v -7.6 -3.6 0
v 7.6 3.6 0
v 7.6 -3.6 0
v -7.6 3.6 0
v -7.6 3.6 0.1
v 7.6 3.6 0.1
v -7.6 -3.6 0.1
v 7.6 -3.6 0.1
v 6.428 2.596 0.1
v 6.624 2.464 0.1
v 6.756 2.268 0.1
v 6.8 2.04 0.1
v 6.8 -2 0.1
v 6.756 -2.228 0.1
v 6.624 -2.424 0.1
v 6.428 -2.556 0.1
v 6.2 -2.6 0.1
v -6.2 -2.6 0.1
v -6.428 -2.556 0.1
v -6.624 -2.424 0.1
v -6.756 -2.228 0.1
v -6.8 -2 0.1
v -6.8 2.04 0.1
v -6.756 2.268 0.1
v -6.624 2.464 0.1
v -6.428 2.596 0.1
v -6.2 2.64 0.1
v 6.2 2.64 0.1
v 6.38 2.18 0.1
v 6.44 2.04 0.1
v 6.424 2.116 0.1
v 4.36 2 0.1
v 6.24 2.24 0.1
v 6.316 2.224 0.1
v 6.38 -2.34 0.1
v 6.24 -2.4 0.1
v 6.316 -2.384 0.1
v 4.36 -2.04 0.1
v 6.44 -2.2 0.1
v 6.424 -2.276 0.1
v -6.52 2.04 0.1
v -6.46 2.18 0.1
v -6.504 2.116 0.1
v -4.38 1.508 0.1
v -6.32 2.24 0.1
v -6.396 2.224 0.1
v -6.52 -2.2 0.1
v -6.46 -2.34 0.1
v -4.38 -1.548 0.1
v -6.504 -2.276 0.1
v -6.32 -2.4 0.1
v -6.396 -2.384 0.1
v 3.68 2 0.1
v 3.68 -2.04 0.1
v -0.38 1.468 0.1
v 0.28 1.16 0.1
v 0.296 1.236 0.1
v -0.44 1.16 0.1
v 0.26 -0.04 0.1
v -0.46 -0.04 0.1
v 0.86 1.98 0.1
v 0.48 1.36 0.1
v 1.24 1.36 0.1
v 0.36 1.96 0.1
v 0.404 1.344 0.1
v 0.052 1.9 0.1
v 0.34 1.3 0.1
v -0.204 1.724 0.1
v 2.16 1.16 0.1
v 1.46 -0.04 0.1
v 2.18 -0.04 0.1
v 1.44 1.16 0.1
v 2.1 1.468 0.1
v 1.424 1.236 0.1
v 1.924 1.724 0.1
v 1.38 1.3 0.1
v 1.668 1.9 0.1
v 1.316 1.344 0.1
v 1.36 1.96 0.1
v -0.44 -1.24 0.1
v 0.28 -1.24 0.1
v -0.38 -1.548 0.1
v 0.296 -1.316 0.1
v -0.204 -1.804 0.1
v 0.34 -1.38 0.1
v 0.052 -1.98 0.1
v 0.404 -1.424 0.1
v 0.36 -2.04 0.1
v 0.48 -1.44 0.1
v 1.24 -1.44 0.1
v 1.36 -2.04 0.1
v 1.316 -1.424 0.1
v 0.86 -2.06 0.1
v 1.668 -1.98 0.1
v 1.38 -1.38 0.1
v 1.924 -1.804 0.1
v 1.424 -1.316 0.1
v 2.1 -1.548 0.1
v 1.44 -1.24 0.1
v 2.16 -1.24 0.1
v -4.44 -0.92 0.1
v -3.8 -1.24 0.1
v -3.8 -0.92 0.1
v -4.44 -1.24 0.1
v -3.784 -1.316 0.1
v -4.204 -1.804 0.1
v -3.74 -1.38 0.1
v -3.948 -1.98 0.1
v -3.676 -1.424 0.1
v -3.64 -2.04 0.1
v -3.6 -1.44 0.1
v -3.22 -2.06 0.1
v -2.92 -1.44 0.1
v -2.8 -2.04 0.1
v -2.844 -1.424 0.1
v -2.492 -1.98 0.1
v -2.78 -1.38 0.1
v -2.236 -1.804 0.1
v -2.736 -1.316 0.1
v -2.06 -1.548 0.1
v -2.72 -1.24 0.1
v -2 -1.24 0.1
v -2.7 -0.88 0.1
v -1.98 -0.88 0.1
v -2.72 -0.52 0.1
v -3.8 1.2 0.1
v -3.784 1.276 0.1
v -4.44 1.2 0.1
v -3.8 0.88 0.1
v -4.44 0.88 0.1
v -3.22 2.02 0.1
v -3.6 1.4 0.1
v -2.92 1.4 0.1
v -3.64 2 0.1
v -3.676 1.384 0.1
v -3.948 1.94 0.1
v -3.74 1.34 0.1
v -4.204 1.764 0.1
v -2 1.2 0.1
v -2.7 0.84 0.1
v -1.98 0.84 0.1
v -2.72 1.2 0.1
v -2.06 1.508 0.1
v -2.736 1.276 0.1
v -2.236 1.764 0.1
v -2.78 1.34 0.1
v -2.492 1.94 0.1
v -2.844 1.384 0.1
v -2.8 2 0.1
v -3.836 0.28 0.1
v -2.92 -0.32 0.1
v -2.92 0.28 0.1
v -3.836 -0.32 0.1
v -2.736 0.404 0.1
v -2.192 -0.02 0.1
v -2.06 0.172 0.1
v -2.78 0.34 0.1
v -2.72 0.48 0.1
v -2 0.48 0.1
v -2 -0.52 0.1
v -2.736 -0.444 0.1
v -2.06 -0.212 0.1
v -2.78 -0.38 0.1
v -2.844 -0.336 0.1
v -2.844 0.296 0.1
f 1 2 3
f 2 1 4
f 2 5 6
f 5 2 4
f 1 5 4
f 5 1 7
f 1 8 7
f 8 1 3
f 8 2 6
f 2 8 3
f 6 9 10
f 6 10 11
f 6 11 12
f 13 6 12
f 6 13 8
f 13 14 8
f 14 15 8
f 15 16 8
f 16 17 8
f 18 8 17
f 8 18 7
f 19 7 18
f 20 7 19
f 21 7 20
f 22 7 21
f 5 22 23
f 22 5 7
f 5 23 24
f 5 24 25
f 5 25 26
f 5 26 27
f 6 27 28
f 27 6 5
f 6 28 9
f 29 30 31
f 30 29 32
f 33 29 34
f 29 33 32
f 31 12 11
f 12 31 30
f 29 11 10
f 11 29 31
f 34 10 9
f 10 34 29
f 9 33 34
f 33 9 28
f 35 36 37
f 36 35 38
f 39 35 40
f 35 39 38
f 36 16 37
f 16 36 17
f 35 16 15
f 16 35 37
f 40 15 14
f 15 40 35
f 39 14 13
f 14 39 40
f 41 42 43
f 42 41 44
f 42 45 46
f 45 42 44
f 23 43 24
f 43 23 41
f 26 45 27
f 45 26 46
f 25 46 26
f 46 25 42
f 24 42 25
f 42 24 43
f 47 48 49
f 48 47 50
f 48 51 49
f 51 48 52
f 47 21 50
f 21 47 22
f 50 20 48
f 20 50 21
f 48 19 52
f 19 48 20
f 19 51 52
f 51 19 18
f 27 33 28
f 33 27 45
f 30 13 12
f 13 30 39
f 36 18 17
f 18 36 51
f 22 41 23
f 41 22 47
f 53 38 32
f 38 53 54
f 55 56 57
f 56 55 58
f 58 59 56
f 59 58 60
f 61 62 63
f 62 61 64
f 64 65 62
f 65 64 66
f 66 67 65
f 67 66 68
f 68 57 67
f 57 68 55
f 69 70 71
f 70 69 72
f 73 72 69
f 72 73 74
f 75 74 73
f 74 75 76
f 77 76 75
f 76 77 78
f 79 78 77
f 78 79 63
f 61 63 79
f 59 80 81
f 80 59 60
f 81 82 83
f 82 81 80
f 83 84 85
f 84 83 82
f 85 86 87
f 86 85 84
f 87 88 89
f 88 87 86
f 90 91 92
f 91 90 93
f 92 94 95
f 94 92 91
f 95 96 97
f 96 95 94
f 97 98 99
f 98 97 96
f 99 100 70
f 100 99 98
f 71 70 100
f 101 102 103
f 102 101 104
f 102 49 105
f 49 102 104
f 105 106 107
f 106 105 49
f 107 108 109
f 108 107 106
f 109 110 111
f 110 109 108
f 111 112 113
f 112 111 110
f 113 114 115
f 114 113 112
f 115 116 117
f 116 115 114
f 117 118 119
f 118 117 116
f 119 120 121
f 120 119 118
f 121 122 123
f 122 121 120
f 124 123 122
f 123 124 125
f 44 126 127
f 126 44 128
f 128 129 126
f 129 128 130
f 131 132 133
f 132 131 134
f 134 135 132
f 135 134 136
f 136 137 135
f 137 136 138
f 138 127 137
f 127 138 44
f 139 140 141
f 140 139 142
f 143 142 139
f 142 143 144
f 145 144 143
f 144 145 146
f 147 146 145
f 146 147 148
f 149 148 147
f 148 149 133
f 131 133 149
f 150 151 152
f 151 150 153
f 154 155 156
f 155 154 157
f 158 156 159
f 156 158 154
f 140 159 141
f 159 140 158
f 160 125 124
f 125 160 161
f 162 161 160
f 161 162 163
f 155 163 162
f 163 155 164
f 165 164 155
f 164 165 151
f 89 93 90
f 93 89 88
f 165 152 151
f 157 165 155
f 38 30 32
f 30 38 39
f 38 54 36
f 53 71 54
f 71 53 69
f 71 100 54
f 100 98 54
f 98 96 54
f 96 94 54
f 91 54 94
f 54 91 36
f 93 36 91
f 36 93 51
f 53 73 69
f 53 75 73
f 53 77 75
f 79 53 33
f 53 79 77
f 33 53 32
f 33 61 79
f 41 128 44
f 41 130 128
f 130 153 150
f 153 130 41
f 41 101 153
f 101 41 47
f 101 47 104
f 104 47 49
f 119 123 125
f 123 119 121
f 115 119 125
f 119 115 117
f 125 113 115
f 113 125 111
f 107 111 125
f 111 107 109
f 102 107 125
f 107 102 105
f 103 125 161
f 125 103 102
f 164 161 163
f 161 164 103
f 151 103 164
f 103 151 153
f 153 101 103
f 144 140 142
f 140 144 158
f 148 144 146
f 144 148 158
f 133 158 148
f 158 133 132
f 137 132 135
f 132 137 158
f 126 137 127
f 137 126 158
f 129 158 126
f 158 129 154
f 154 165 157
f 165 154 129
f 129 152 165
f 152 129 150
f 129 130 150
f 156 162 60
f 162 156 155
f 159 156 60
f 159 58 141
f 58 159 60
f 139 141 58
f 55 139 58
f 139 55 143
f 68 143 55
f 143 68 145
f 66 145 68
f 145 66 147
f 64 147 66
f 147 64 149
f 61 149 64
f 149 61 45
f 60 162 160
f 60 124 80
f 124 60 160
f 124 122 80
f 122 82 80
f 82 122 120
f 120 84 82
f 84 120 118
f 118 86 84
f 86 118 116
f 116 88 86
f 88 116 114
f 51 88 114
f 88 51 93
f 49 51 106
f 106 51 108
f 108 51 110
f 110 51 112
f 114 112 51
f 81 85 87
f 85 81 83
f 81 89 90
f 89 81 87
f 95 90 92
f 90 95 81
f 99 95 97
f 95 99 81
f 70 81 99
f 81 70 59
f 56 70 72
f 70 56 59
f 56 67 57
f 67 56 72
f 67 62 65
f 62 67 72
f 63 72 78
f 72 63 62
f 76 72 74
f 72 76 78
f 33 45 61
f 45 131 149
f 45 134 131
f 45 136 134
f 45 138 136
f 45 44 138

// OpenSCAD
// file: ../p/box5-12.scad
use <../lib.scad>
function ldraw_lib__box5_12() = [
// 0 Box with 5 Faces without Any Edges
// 0 Name: box5-12.dat
// 0 Author: Chris Dee [cwdee]
// 0 !LDRAW_ORG Primitive UPDATE 2009-02
// 0 !LICENSE Licensed under CC BY 4.0 : see CAreadme.txt
// 
// 0 BFC CERTIFY CCW
  [0,"BFC","CERTIFY"],
  [0,"BFC","CCW"],
// 
// 0 !HISTORY 2009-09-03 [PTadmin] Official Update 2009-02
// 
// 
// 4 16 1 1 1 1 1 -1 -1 1 -1 -1 1 1
  [4,16,1,1,1,1,1,-1,-1,1,-1,-1,1,1],
// 4 16 -1 0 1 1 0 1 1 1 1 -1 1 1
  [4,16,-1,0,1,1,0,1,1,1,1,-1,1,1],
// 4 16 -1 0 -1 -1 0 1 -1 1 1 -1 1 -1
  [4,16,-1,0,-1,-1,0,1,-1,1,1,-1,1,-1],
// 4 16 1 0 -1 -1 0 -1 -1 1 -1 1 1 -1
  [4,16,1,0,-1,-1,0,-1,-1,1,-1,1,1,-1],
// 4 16 1 0 1 1 0 -1 1 1 -1 1 1 1
  [4,16,1,0,1,1,0,-1,1,1,-1,1,1,1],
// 0
];
module ldraw_lib__box5_12(step=0, col=false, unit=2/5, alt=false, line=0.2, solid=!$preview)
    makepoly(ldraw_lib__box5_12(), step=step, col=col, unit=unit, alt=alt, line=line, solid=solid);
ldraw_lib__box5_12(line=0.2);
// main file
use <../lib.scad>
use <../p/box5-12.scad>
function ldraw_lib__4174735e() = [
// 0 Sticker  0.9 x  1.9 with White "301" on Black Background with Silver Outline
// 0 Name: 4174735e.dat
// 0 Author: Gerald Lasser [GeraldLasser]
// 0 !LDRAW_ORG Part UPDATE 2024-04
// 0 !LICENSE Licensed under CC BY 4.0 : see CAreadme.txt
// 
// 0 BFC CERTIFY CCW
  [0,"BFC","CERTIFY"],
  [0,"BFC","CCW"],
// 
// 0 !KEYWORDS santa fe, Set 10020
// 
// 0 !HISTORY 2024-05-28 [OrionP] Official Update 2024-04
// 
// 
// 1 16 0 -0.25 0 19 0 0 0 0.25 0 0 0 9 box5-12.dat
  [1,16,0,-0.25,0,19,0,0,0,0.25,0,0,0,9, ldraw_lib__box5_12()],
// 
// 3 16 19 -.25 9 16.07 -.25 6.49 16.56 -.25 6.16
  [3,16,19,-.25,9,16.07,-.25,6.49,16.56,-.25,6.16],
// 3 16 19 -.25 9 16.56 -.25 6.16 16.89 -.25 5.67
  [3,16,19,-.25,9,16.56,-.25,6.16,16.89,-.25,5.67],
// 3 16 19 -.25 9 16.89 -.25 5.67 17 -.25 5.1
  [3,16,19,-.25,9,16.89,-.25,5.67,17,-.25,5.1],
// 4 16 19 -.25 9 17 -.25 5.1 17 -.25 -5 19 -.25 -9
  [4,16,19,-.25,9,17,-.25,5.1,17,-.25,-5,19,-.25,-9],
// 3 16 17 -.25 -5 16.89 -.25 -5.57 19 -.25 -9
  [3,16,17,-.25,-5,16.89,-.25,-5.57,19,-.25,-9],
// 3 16 16.89 -.25 -5.57 16.56 -.25 -6.06 19 -.25 -9
  [3,16,16.89,-.25,-5.57,16.56,-.25,-6.06,19,-.25,-9],
// 3 16 16.56 -.25 -6.06 16.07 -.25 -6.39 19 -.25 -9
  [3,16,16.56,-.25,-6.06,16.07,-.25,-6.39,19,-.25,-9],
// 3 16 16.07 -.25 -6.39 15.5 -.25 -6.5 19 -.25 -9
  [3,16,16.07,-.25,-6.39,15.5,-.25,-6.5,19,-.25,-9],
// 4 16 19 -.25 -9 15.5 -.25 -6.5 -15.5 -.25 -6.5 -19 -.25 -9
  [4,16,19,-.25,-9,15.5,-.25,-6.5,-15.5,-.25,-6.5,-19,-.25,-9],
// 3 16 -16.07 -.25 -6.39 -19 -.25 -9 -15.5 -.25 -6.5
  [3,16,-16.07,-.25,-6.39,-19,-.25,-9,-15.5,-.25,-6.5],
// 3 16 -16.56 -.25 -6.06 -19 -.25 -9 -16.07 -.25 -6.39
  [3,16,-16.56,-.25,-6.06,-19,-.25,-9,-16.07,-.25,-6.39],
// 3 16 -16.89 -.25 -5.57 -19 -.25 -9 -16.56 -.25 -6.06
  [3,16,-16.89,-.25,-5.57,-19,-.25,-9,-16.56,-.25,-6.06],
// 3 16 -17 -.25 -5 -19 -.25 -9 -16.89 -.25 -5.57
  [3,16,-17,-.25,-5,-19,-.25,-9,-16.89,-.25,-5.57],
// 4 16 -19 -.25 -9 -17 -.25 -5 -17 -.25 5.1 -19 -.25 9
  [4,16,-19,-.25,-9,-17,-.25,-5,-17,-.25,5.1,-19,-.25,9],
// 3 16 -19 -.25 9 -17 -.25 5.1 -16.89 -.25 5.67
  [3,16,-19,-.25,9,-17,-.25,5.1,-16.89,-.25,5.67],
// 3 16 -19 -.25 9 -16.89 -.25 5.67 -16.56 -.25 6.16
  [3,16,-19,-.25,9,-16.89,-.25,5.67,-16.56,-.25,6.16],
// 3 16 -19 -.25 9 -16.56 -.25 6.16 -16.07 -.25 6.49
  [3,16,-19,-.25,9,-16.56,-.25,6.16,-16.07,-.25,6.49],
// 3 16 -19 -.25 9 -16.07 -.25 6.49 -15.5 -.25 6.6
  [3,16,-19,-.25,9,-16.07,-.25,6.49,-15.5,-.25,6.6],
// 4 16 19 -.25 9 -19 -.25 9 -15.5 -.25 6.6 15.5 -.25 6.6
  [4,16,19,-.25,9,-19,-.25,9,-15.5,-.25,6.6,15.5,-.25,6.6],
// 3 16 19 -.25 9 15.5 -.25 6.6 16.07 -.25 6.49
  [3,16,19,-.25,9,15.5,-.25,6.6,16.07,-.25,6.49],
// 
// 0 BFC NOCLIP
  [0,"BFC","NOCLIP"],
// 4 0 10.9 -.25 5 16.1 -.25 5.1 16.06 -.25 5.29 15.95 -.25 5.45
  [4,0,10.9,-.25,5,16.1,-.25,5.1,16.06,-.25,5.29,15.95,-.25,5.45],
// 4 0 10.9 -.25 5 15.95 -.25 5.45 15.79 -.25 5.56 15.6 -.25 5.6
  [4,0,10.9,-.25,5,15.95,-.25,5.45,15.79,-.25,5.56,15.6,-.25,5.6],
// 4 80 16.06 -.25 5.29 16.1 -.25 5.1 17 -.25 5.1 16.89 -.25 5.67
  [4,80,16.06,-.25,5.29,16.1,-.25,5.1,17,-.25,5.1,16.89,-.25,5.67],
// 4 80 15.95 -.25 5.45 16.06 -.25 5.29 16.89 -.25 5.67 16.56 -.25 6.16
  [4,80,15.95,-.25,5.45,16.06,-.25,5.29,16.89,-.25,5.67,16.56,-.25,6.16],
// 4 80 15.79 -.25 5.56 15.95 -.25 5.45 16.56 -.25 6.16 16.07 -.25 6.49
  [4,80,15.79,-.25,5.56,15.95,-.25,5.45,16.56,-.25,6.16,16.07,-.25,6.49],
// 4 80 15.6 -.25 5.6 15.79 -.25 5.56 16.07 -.25 6.49 15.5 -.25 6.6
  [4,80,15.6,-.25,5.6,15.79,-.25,5.56,16.07,-.25,6.49,15.5,-.25,6.6],
// 4 0 10.9 -.25 -5.1 15.6 -.25 -6 15.79 -.25 -5.96 15.95 -.25 -5.85
  [4,0,10.9,-.25,-5.1,15.6,-.25,-6,15.79,-.25,-5.96,15.95,-.25,-5.85],
// 4 0 10.9 -.25 -5.1 15.95 -.25 -5.85 16.06 -.25 -5.69 16.1 -.25 -5.5
  [4,0,10.9,-.25,-5.1,15.95,-.25,-5.85,16.06,-.25,-5.69,16.1,-.25,-5.5],
// 4 80 15.79 -.25 -5.96 15.6 -.25 -6 15.5 -.25 -6.5 16.07 -.25 -6.39
  [4,80,15.79,-.25,-5.96,15.6,-.25,-6,15.5,-.25,-6.5,16.07,-.25,-6.39],
// 4 80 15.95 -.25 -5.85 15.79 -.25 -5.96 16.07 -.25 -6.39 16.56 -.25 -6.06
  [4,80,15.95,-.25,-5.85,15.79,-.25,-5.96,16.07,-.25,-6.39,16.56,-.25,-6.06],
// 4 80 16.06 -.25 -5.69 15.95 -.25 -5.85 16.56 -.25 -6.06 16.89 -.25 -5.57
  [4,80,16.06,-.25,-5.69,15.95,-.25,-5.85,16.56,-.25,-6.06,16.89,-.25,-5.57],
// 4 80 16.1 -.25 -5.5 16.06 -.25 -5.69 16.89 -.25 -5.57 17 -.25 -5
  [4,80,16.1,-.25,-5.5,16.06,-.25,-5.69,16.89,-.25,-5.57,17,-.25,-5],
// 4 0 -16.26 -.25 5.29 -16.3 -.25 5.1 -10.95 -.25 3.77 -16.15 -.25 5.45
  [4,0,-16.26,-.25,5.29,-16.3,-.25,5.1,-10.95,-.25,3.77,-16.15,-.25,5.45],
// 4 0 -10.95 -.25 3.77 -15.8 -.25 5.6 -15.99 -.25 5.56 -16.15 -.25 5.45
  [4,0,-10.95,-.25,3.77,-15.8,-.25,5.6,-15.99,-.25,5.56,-16.15,-.25,5.45],
// 4 80 -16.3 -.25 5.1 -16.26 -.25 5.29 -16.89 -.25 5.67 -17 -.25 5.1
  [4,80,-16.3,-.25,5.1,-16.26,-.25,5.29,-16.89,-.25,5.67,-17,-.25,5.1],
// 4 80 -15.99 -.25 5.56 -15.8 -.25 5.6 -15.5 -.25 6.6 -16.07 -.25 6.49
  [4,80,-15.99,-.25,5.56,-15.8,-.25,5.6,-15.5,-.25,6.6,-16.07,-.25,6.49],
// 4 80 -16.15 -.25 5.45 -15.99 -.25 5.56 -16.07 -.25 6.49 -16.56 -.25 6.16
  [4,80,-16.15,-.25,5.45,-15.99,-.25,5.56,-16.07,-.25,6.49,-16.56,-.25,6.16],
// 4 80 -16.26 -.25 5.29 -16.15 -.25 5.45 -16.56 -.25 6.16 -16.89 -.25 5.67
  [4,80,-16.26,-.25,5.29,-16.15,-.25,5.45,-16.56,-.25,6.16,-16.89,-.25,5.67],
// 4 0 -10.95 -.25 -3.87 -16.3 -.25 -5.5 -16.26 -.25 -5.69 -16.15 -.25 -5.85
  [4,0,-10.95,-.25,-3.87,-16.3,-.25,-5.5,-16.26,-.25,-5.69,-16.15,-.25,-5.85],
// 4 0 -10.95 -.25 -3.87 -16.15 -.25 -5.85 -15.99 -.25 -5.96 -15.8 -.25 -6
  [4,0,-10.95,-.25,-3.87,-16.15,-.25,-5.85,-15.99,-.25,-5.96,-15.8,-.25,-6],
// 4 80 -16.26 -.25 -5.69 -16.3 -.25 -5.5 -17 -.25 -5 -16.89 -.25 -5.57
  [4,80,-16.26,-.25,-5.69,-16.3,-.25,-5.5,-17,-.25,-5,-16.89,-.25,-5.57],
// 4 80 -16.15 -.25 -5.85 -16.26 -.25 -5.69 -16.89 -.25 -5.57 -16.56 -.25 -6.06
  [4,80,-16.15,-.25,-5.85,-16.26,-.25,-5.69,-16.89,-.25,-5.57,-16.56,-.25,-6.06],
// 4 80 -15.99 -.25 -5.96 -16.15 -.25 -5.85 -16.56 -.25 -6.06 -16.07 -.25 -6.39
  [4,80,-15.99,-.25,-5.96,-16.15,-.25,-5.85,-16.56,-.25,-6.06,-16.07,-.25,-6.39],
// 4 80 -15.8 -.25 -6 -15.99 -.25 -5.96 -16.07 -.25 -6.39 -15.5 -.25 -6.5
  [4,80,-15.8,-.25,-6,-15.99,-.25,-5.96,-16.07,-.25,-6.39,-15.5,-.25,-6.5],
// 4 80 15.5 -.25 6.6 -15.5 -.25 6.6 -15.8 -.25 5.6 15.6 -.25 5.6
  [4,80,15.5,-.25,6.6,-15.5,-.25,6.6,-15.8,-.25,5.6,15.6,-.25,5.6],
// 4 80 17 -.25 5.1 16.1 -.25 5.1 16.1 -.25 -5.5 17 -.25 -5
  [4,80,17,-.25,5.1,16.1,-.25,5.1,16.1,-.25,-5.5,17,-.25,-5],
// 4 80 15.5 -.25 -6.5 15.6 -.25 -6 -15.8 -.25 -6 -15.5 -.25 -6.5
  [4,80,15.5,-.25,-6.5,15.6,-.25,-6,-15.8,-.25,-6,-15.5,-.25,-6.5],
// 4 80 -17 -.25 -5 -16.3 -.25 -5.5 -16.3 -.25 5.1 -17 -.25 5.1
  [4,80,-17,-.25,-5,-16.3,-.25,-5.5,-16.3,-.25,5.1,-17,-.25,5.1],
// 4 15 10.9 -.25 -5.1 10.9 -.25 5 9.2 -.25 5 9.2 -.25 -5.1
  [4,15,10.9,-.25,-5.1,10.9,-.25,5,9.2,-.25,5,9.2,-.25,-5.1],
// 4 15 .7 -.25 2.9 .74 -.25 3.09 -.95 -.25 3.67 -1.1 -.25 2.9
  [4,15,.7,-.25,2.9,.74,-.25,3.09,-.95,-.25,3.67,-1.1,-.25,2.9],
// 4 15 .65 -.25 -.1 .7 -.25 2.9 -1.1 -.25 2.9 -1.15 -.25 -.1
  [4,15,.65,-.25,-.1,.7,-.25,2.9,-1.1,-.25,2.9,-1.15,-.25,-.1],
// 4 15 1.2 -.25 3.4 3.1 -.25 3.4 2.15 -.25 4.95 .9 -.25 4.9
  [4,15,1.2,-.25,3.4,3.1,-.25,3.4,2.15,-.25,4.95,.9,-.25,4.9],
// 4 15 1.01 -.25 3.36 1.2 -.25 3.4 .9 -.25 4.9 .13 -.25 4.75
  [4,15,1.01,-.25,3.36,1.2,-.25,3.4,.9,-.25,4.9,.13,-.25,4.75],
// 4 15 .85 -.25 3.25 1.01 -.25 3.36 .13 -.25 4.75 -.51 -.25 4.31
  [4,15,.85,-.25,3.25,1.01,-.25,3.36,.13,-.25,4.75,-.51,-.25,4.31],
// 4 15 .74 -.25 3.09 .85 -.25 3.25 -.51 -.25 4.31 -.95 -.25 3.67
  [4,15,.74,-.25,3.09,.85,-.25,3.25,-.51,-.25,4.31,-.95,-.25,3.67],
// 4 15 3.6 -.25 2.9 3.65 -.25 -.1 5.45 -.25 -.1 5.4 -.25 2.9
  [4,15,3.6,-.25,2.9,3.65,-.25,-.1,5.45,-.25,-.1,5.4,-.25,2.9],
// 4 15 3.56 -.25 3.09 3.6 -.25 2.9 5.4 -.25 2.9 5.25 -.25 3.67
  [4,15,3.56,-.25,3.09,3.6,-.25,2.9,5.4,-.25,2.9,5.25,-.25,3.67],
// 4 15 3.45 -.25 3.25 3.56 -.25 3.09 5.25 -.25 3.67 4.81 -.25 4.31
  [4,15,3.45,-.25,3.25,3.56,-.25,3.09,5.25,-.25,3.67,4.81,-.25,4.31],
// 4 15 3.29 -.25 3.36 3.45 -.25 3.25 4.81 -.25 4.31 4.17 -.25 4.75
  [4,15,3.29,-.25,3.36,3.45,-.25,3.25,4.81,-.25,4.31,4.17,-.25,4.75],
// 4 15 3.1 -.25 3.4 3.29 -.25 3.36 4.17 -.25 4.75 3.4 -.25 4.9
  [4,15,3.1,-.25,3.4,3.29,-.25,3.36,4.17,-.25,4.75,3.4,-.25,4.9],
// 3 15 2.15 -.25 4.95 3.1 -.25 3.4 3.4 -.25 4.9
  [3,15,2.15,-.25,4.95,3.1,-.25,3.4,3.4,-.25,4.9],
// 4 15 .7 -.25 -3.1 .65 -.25 -.1 -1.15 -.25 -.1 -1.1 -.25 -3.1
  [4,15,.7,-.25,-3.1,.65,-.25,-.1,-1.15,-.25,-.1,-1.1,-.25,-3.1],
// 4 15 .74 -.25 -3.29 .7 -.25 -3.1 -1.1 -.25 -3.1 -.95 -.25 -3.87
  [4,15,.74,-.25,-3.29,.7,-.25,-3.1,-1.1,-.25,-3.1,-.95,-.25,-3.87],
// 4 15 .85 -.25 -3.45 .74 -.25 -3.29 -.95 -.25 -3.87 -.51 -.25 -4.51
  [4,15,.85,-.25,-3.45,.74,-.25,-3.29,-.95,-.25,-3.87,-.51,-.25,-4.51],
// 4 15 1.01 -.25 -3.56 .85 -.25 -3.45 -.51 -.25 -4.51 .13 -.25 -4.95
  [4,15,1.01,-.25,-3.56,.85,-.25,-3.45,-.51,-.25,-4.51,.13,-.25,-4.95],
// 4 15 1.2 -.25 -3.6 1.01 -.25 -3.56 .13 -.25 -4.95 .9 -.25 -5.1
  [4,15,1.2,-.25,-3.6,1.01,-.25,-3.56,.13,-.25,-4.95,.9,-.25,-5.1],
// 4 15 3.1 -.25 -3.6 2.15 -.25 -5.15 3.4 -.25 -5.1 3.29 -.25 -3.56
  [4,15,3.1,-.25,-3.6,2.15,-.25,-5.15,3.4,-.25,-5.1,3.29,-.25,-3.56],
// 4 15 3.29 -.25 -3.56 3.4 -.25 -5.1 4.17 -.25 -4.95 3.45 -.25 -3.45
  [4,15,3.29,-.25,-3.56,3.4,-.25,-5.1,4.17,-.25,-4.95,3.45,-.25,-3.45],
// 4 15 3.45 -.25 -3.45 4.17 -.25 -4.95 4.81 -.25 -4.51 3.56 -.25 -3.29
  [4,15,3.45,-.25,-3.45,4.17,-.25,-4.95,4.81,-.25,-4.51,3.56,-.25,-3.29],
// 4 15 3.56 -.25 -3.29 4.81 -.25 -4.51 5.25 -.25 -3.87 3.6 -.25 -3.1
  [4,15,3.56,-.25,-3.29,4.81,-.25,-4.51,5.25,-.25,-3.87,3.6,-.25,-3.1],
// 4 15 3.6 -.25 -3.1 5.25 -.25 -3.87 5.4 -.25 -3.1 3.65 -.25 -.1
  [4,15,3.6,-.25,-3.1,5.25,-.25,-3.87,5.4,-.25,-3.1,3.65,-.25,-.1],
// 3 15 5.45 -.25 -.1 3.65 -.25 -.1 5.4 -.25 -3.1
  [3,15,5.45,-.25,-.1,3.65,-.25,-.1,5.4,-.25,-3.1],
// 4 15 -9.5 -.25 -3.1 -9.5 -.25 -2.3 -11.1 -.25 -2.3 -11.1 -.25 -3.1
  [4,15,-9.5,-.25,-3.1,-9.5,-.25,-2.3,-11.1,-.25,-2.3,-11.1,-.25,-3.1],
// 4 15 -9.46 -.25 -3.29 -9.5 -.25 -3.1 -11.1 -.25 -3.1 -10.95 -.25 -3.87
  [4,15,-9.46,-.25,-3.29,-9.5,-.25,-3.1,-11.1,-.25,-3.1,-10.95,-.25,-3.87],
// 4 15 -9.35 -.25 -3.45 -9.46 -.25 -3.29 -10.95 -.25 -3.87 -10.51 -.25 -4.51
  [4,15,-9.35,-.25,-3.45,-9.46,-.25,-3.29,-10.95,-.25,-3.87,-10.51,-.25,-4.51],
// 4 15 -9.19 -.25 -3.56 -9.35 -.25 -3.45 -10.51 -.25 -4.51 -9.87 -.25 -4.95
  [4,15,-9.19,-.25,-3.56,-9.35,-.25,-3.45,-10.51,-.25,-4.51,-9.87,-.25,-4.95],
// 4 15 -9 -.25 -3.6 -9.19 -.25 -3.56 -9.87 -.25 -4.95 -9.1 -.25 -5.1
  [4,15,-9,-.25,-3.6,-9.19,-.25,-3.56,-9.87,-.25,-4.95,-9.1,-.25,-5.1],
// 4 15 -9 -.25 -3.6 -9.1 -.25 -5.1 -8.05 -.25 -5.15 -7.3 -.25 -3.6
  [4,15,-9,-.25,-3.6,-9.1,-.25,-5.1,-8.05,-.25,-5.15,-7.3,-.25,-3.6],
// 4 15 -7.3 -.25 -3.6 -8.05 -.25 -5.15 -7 -.25 -5.1 -7.11 -.25 -3.56
  [4,15,-7.3,-.25,-3.6,-8.05,-.25,-5.15,-7,-.25,-5.1,-7.11,-.25,-3.56],
// 4 15 -7.11 -.25 -3.56 -7 -.25 -5.1 -6.23 -.25 -4.95 -6.95 -.25 -3.45
  [4,15,-7.11,-.25,-3.56,-7,-.25,-5.1,-6.23,-.25,-4.95,-6.95,-.25,-3.45],
// 4 15 -6.95 -.25 -3.45 -6.23 -.25 -4.95 -5.59 -.25 -4.51 -6.84 -.25 -3.29
  [4,15,-6.95,-.25,-3.45,-6.23,-.25,-4.95,-5.59,-.25,-4.51,-6.84,-.25,-3.29],
// 4 15 -6.84 -.25 -3.29 -5.59 -.25 -4.51 -5.15 -.25 -3.87 -6.8 -.25 -3.1
  [4,15,-6.84,-.25,-3.29,-5.59,-.25,-4.51,-5.15,-.25,-3.87,-6.8,-.25,-3.1],
// 4 15 -6.8 -.25 -3.1 -5.15 -.25 -3.87 -5 -.25 -3.1 -6.75 -.25 -2.2
  [4,15,-6.8,-.25,-3.1,-5.15,-.25,-3.87,-5,-.25,-3.1,-6.75,-.25,-2.2],
// 4 15 -6.75 -.25 -2.2 -5 -.25 -3.1 -4.95 -.25 -2.2 -6.8 -.25 -1.3
  [4,15,-6.75,-.25,-2.2,-5,-.25,-3.1,-4.95,-.25,-2.2,-6.8,-.25,-1.3],
// 4 15 -9.5 -.25 3 -9.46 -.25 3.19 -10.95 -.25 3.77 -11.1 -.25 3
  [4,15,-9.5,-.25,3,-9.46,-.25,3.19,-10.95,-.25,3.77,-11.1,-.25,3],
// 4 15 -9.5 -.25 2.2 -9.5 -.25 3 -11.1 -.25 3 -11.1 -.25 2.2
  [4,15,-9.5,-.25,2.2,-9.5,-.25,3,-11.1,-.25,3,-11.1,-.25,2.2],
// 4 15 -9 -.25 3.5 -7.3 -.25 3.5 -8.05 -.25 5.05 -9.1 -.25 5
  [4,15,-9,-.25,3.5,-7.3,-.25,3.5,-8.05,-.25,5.05,-9.1,-.25,5],
// 4 15 -9.19 -.25 3.46 -9 -.25 3.5 -9.1 -.25 5 -9.87 -.25 4.85
  [4,15,-9.19,-.25,3.46,-9,-.25,3.5,-9.1,-.25,5,-9.87,-.25,4.85],
// 4 15 -9.35 -.25 3.35 -9.19 -.25 3.46 -9.87 -.25 4.85 -10.51 -.25 4.41
  [4,15,-9.35,-.25,3.35,-9.19,-.25,3.46,-9.87,-.25,4.85,-10.51,-.25,4.41],
// 4 15 -9.46 -.25 3.19 -9.35 -.25 3.35 -10.51 -.25 4.41 -10.95 -.25 3.77
  [4,15,-9.46,-.25,3.19,-9.35,-.25,3.35,-10.51,-.25,4.41,-10.95,-.25,3.77],
// 4 15 -6.8 -.25 3 -6.75 -.25 2.1 -4.95 -.25 2.1 -5 -.25 3
  [4,15,-6.8,-.25,3,-6.75,-.25,2.1,-4.95,-.25,2.1,-5,-.25,3],
// 4 15 -6.84 -.25 3.19 -6.8 -.25 3 -5 -.25 3 -5.15 -.25 3.77
  [4,15,-6.84,-.25,3.19,-6.8,-.25,3,-5,-.25,3,-5.15,-.25,3.77],
// 4 15 -6.95 -.25 3.35 -6.84 -.25 3.19 -5.15 -.25 3.77 -5.59 -.25 4.41
  [4,15,-6.95,-.25,3.35,-6.84,-.25,3.19,-5.15,-.25,3.77,-5.59,-.25,4.41],
// 4 15 -7.11 -.25 3.46 -6.95 -.25 3.35 -5.59 -.25 4.41 -6.23 -.25 4.85
  [4,15,-7.11,-.25,3.46,-6.95,-.25,3.35,-5.59,-.25,4.41,-6.23,-.25,4.85],
// 4 15 -7.3 -.25 3.5 -7.11 -.25 3.46 -6.23 -.25 4.85 -7 -.25 5
  [4,15,-7.3,-.25,3.5,-7.11,-.25,3.46,-6.23,-.25,4.85,-7,-.25,5],
// 3 15 -8.05 -.25 5.05 -7.3 -.25 3.5 -7 -.25 5
  [3,15,-8.05,-.25,5.05,-7.3,-.25,3.5,-7,-.25,5],
// 4 15 -7.3 -.25 .7 -9.59 -.25 .7 -9.59 -.25 -.8 -7.3 -.25 -.8
  [4,15,-7.3,-.25,.7,-9.59,-.25,.7,-9.59,-.25,-.8,-7.3,-.25,-.8],
// 4 15 -6.84 -.25 1.01 -6.95 -.25 .85 -5.48 -.25 -.05 -5.15 -.25 .43
  [4,15,-6.84,-.25,1.01,-6.95,-.25,.85,-5.48,-.25,-.05,-5.15,-.25,.43],
// 4 15 -6.8 -.25 1.2 -6.84 -.25 1.01 -5.15 -.25 .43 -5 -.25 1.2
  [4,15,-6.8,-.25,1.2,-6.84,-.25,1.01,-5.15,-.25,.43,-5,-.25,1.2],
// 4 15 -6.75 -.25 2.1 -6.8 -.25 1.2 -5 -.25 1.2 -4.95 -.25 2.1
  [4,15,-6.75,-.25,2.1,-6.8,-.25,1.2,-5,-.25,1.2,-4.95,-.25,2.1],
// 4 15 -6.8 -.25 -1.3 -4.95 -.25 -2.2 -5 -.25 -1.3 -6.84 -.25 -1.11
  [4,15,-6.8,-.25,-1.3,-4.95,-.25,-2.2,-5,-.25,-1.3,-6.84,-.25,-1.11],
// 4 15 -6.84 -.25 -1.11 -5 -.25 -1.3 -5.15 -.25 -.53 -6.95 -.25 -.95
  [4,15,-6.84,-.25,-1.11,-5,-.25,-1.3,-5.15,-.25,-.53,-6.95,-.25,-.95],
// 4 15 -5.48 -.25 -.05 -7.11 -.25 -.84 -6.95 -.25 -.95 -5.15 -.25 -.53
  [4,15,-5.48,-.25,-.05,-7.11,-.25,-.84,-6.95,-.25,-.95,-5.15,-.25,-.53],
// 4 15 -7.3 -.25 -.8 -7.11 -.25 -.84 -5.48 -.25 -.05 -7.11 -.25 .74
  [4,15,-7.3,-.25,-.8,-7.11,-.25,-.84,-5.48,-.25,-.05,-7.11,-.25,.74],
// 4 15 1.2 -.25 -3.6 .9 -.25 -5.1 2.15 -.25 -5.15 3.1 -.25 -3.6
  [4,15,1.2,-.25,-3.6,.9,-.25,-5.1,2.15,-.25,-5.15,3.1,-.25,-3.6],
// 3 15 -7.11 -.25 .74 -7.3 -.25 .7 -7.3 -.25 -.8
  [3,15,-7.11,-.25,.74,-7.3,-.25,.7,-7.3,-.25,-.8],
// 3 15 -6.95 -.25 .85 -7.11 -.25 .74 -5.48 -.25 -.05
  [3,15,-6.95,-.25,.85,-7.11,-.25,.74,-5.48,-.25,-.05],
// 4 0 10.9 -.25 5 10.9 -.25 -5.1 16.1 -.25 -5.5 16.1 -.25 5.1
  [4,0,10.9,-.25,5,10.9,-.25,-5.1,16.1,-.25,-5.5,16.1,-.25,5.1],
// 3 0 10.9 -.25 -5.1 9.2 -.25 -5.1 15.6 -.25 -6
  [3,0,10.9,-.25,-5.1,9.2,-.25,-5.1,15.6,-.25,-6],
// 4 0 9.2 -.25 5 5.4 -.25 2.9 5.45 -.25 -.1 9.2 -.25 -5.1
  [4,0,9.2,-.25,5,5.4,-.25,2.9,5.45,-.25,-.1,9.2,-.25,-5.1],
// 3 0 5.45 -.25 -.1 5.4 -.25 -3.1 9.2 -.25 -5.1
  [3,0,5.45,-.25,-.1,5.4,-.25,-3.1,9.2,-.25,-5.1],
// 3 0 5.4 -.25 -3.1 5.25 -.25 -3.87 9.2 -.25 -5.1
  [3,0,5.4,-.25,-3.1,5.25,-.25,-3.87,9.2,-.25,-5.1],
// 3 0 5.25 -.25 -3.87 4.81 -.25 -4.51 9.2 -.25 -5.1
  [3,0,5.25,-.25,-3.87,4.81,-.25,-4.51,9.2,-.25,-5.1],
// 3 0 4.81 -.25 -4.51 4.17 -.25 -4.95 9.2 -.25 -5.1
  [3,0,4.81,-.25,-4.51,4.17,-.25,-4.95,9.2,-.25,-5.1],
// 4 0 9.2 -.25 -5.1 4.17 -.25 -4.95 3.4 -.25 -5.1 15.6 -.25 -6
  [4,0,9.2,-.25,-5.1,4.17,-.25,-4.95,3.4,-.25,-5.1,15.6,-.25,-6],
// 4 0 15.6 -.25 -6 3.4 -.25 -5.1 2.15 -.25 -5.15 -15.8 -.25 -6
  [4,0,15.6,-.25,-6,3.4,-.25,-5.1,2.15,-.25,-5.15,-15.8,-.25,-6],
// 3 0 9.2 -.25 5 5.25 -.25 3.67 5.4 -.25 2.9
  [3,0,9.2,-.25,5,5.25,-.25,3.67,5.4,-.25,2.9],
// 3 0 9.2 -.25 5 4.81 -.25 4.31 5.25 -.25 3.67
  [3,0,9.2,-.25,5,4.81,-.25,4.31,5.25,-.25,3.67],
// 3 0 9.2 -.25 5 4.17 -.25 4.75 4.81 -.25 4.31
  [3,0,9.2,-.25,5,4.17,-.25,4.75,4.81,-.25,4.31],
// 4 0 3.4 -.25 4.9 4.17 -.25 4.75 9.2 -.25 5 15.6 -.25 5.6
  [4,0,3.4,-.25,4.9,4.17,-.25,4.75,9.2,-.25,5,15.6,-.25,5.6],
// 3 0 15.6 -.25 5.6 9.2 -.25 5 10.9 -.25 5
  [3,0,15.6,-.25,5.6,9.2,-.25,5,10.9,-.25,5],
// 3 0 15.6 -.25 5.6 2.15 -.25 4.95 3.4 -.25 4.9
  [3,0,15.6,-.25,5.6,2.15,-.25,4.95,3.4,-.25,4.9],
// 3 0 -16.3 -.25 5.1 -11.1 -.25 3 -10.95 -.25 3.77
  [3,0,-16.3,-.25,5.1,-11.1,-.25,3,-10.95,-.25,3.77],
// 3 0 -16.3 -.25 5.1 -11.1 -.25 2.2 -11.1 -.25 3
  [3,0,-16.3,-.25,5.1,-11.1,-.25,2.2,-11.1,-.25,3],
// 4 0 -9.59 -.25 .7 -11.1 -.25 2.2 -16.3 -.25 5.1 -9.59 -.25 -.8
  [4,0,-9.59,-.25,.7,-11.1,-.25,2.2,-16.3,-.25,5.1,-9.59,-.25,-.8],
// 4 0 -11.1 -.25 -2.3 -9.59 -.25 -.8 -16.3 -.25 5.1 -16.3 -.25 -5.5
  [4,0,-11.1,-.25,-2.3,-9.59,-.25,-.8,-16.3,-.25,5.1,-16.3,-.25,-5.5],
// 3 0 -11.1 -.25 -2.3 -16.3 -.25 -5.5 -11.1 -.25 -3.1
  [3,0,-11.1,-.25,-2.3,-16.3,-.25,-5.5,-11.1,-.25,-3.1],
// 3 0 -11.1 -.25 -3.1 -16.3 -.25 -5.5 -10.95 -.25 -3.87
  [3,0,-11.1,-.25,-3.1,-16.3,-.25,-5.5,-10.95,-.25,-3.87],
// 4 0 -6.8 -.25 -3.1 -6.75 -.25 -2.2 -6.8 -.25 -1.3 -6.84 -.25 -3.29
  [4,0,-6.8,-.25,-3.1,-6.75,-.25,-2.2,-6.8,-.25,-1.3,-6.84,-.25,-3.29],
// 4 0 -6.95 -.25 -3.45 -6.84 -.25 -3.29 -6.8 -.25 -1.3 -7.11 -.25 -3.56
  [4,0,-6.95,-.25,-3.45,-6.84,-.25,-3.29,-6.8,-.25,-1.3,-7.11,-.25,-3.56],
// 4 0 -7.3 -.25 -3.6 -7.11 -.25 -3.56 -6.8 -.25 -1.3 -9 -.25 -3.6
  [4,0,-7.3,-.25,-3.6,-7.11,-.25,-3.56,-6.8,-.25,-1.3,-9,-.25,-3.6],
// 4 0 -9.19 -.25 -3.56 -9 -.25 -3.6 -6.8 -.25 -1.3 -9.35 -.25 -3.45
  [4,0,-9.19,-.25,-3.56,-9,-.25,-3.6,-6.8,-.25,-1.3,-9.35,-.25,-3.45],
// 4 0 -9.46 -.25 -3.29 -9.35 -.25 -3.45 -6.8 -.25 -1.3 -9.5 -.25 -3.1
  [4,0,-9.46,-.25,-3.29,-9.35,-.25,-3.45,-6.8,-.25,-1.3,-9.5,-.25,-3.1],
// 4 0 -9.5 -.25 -2.3 -9.5 -.25 -3.1 -6.8 -.25 -1.3 -6.84 -.25 -1.11
  [4,0,-9.5,-.25,-2.3,-9.5,-.25,-3.1,-6.8,-.25,-1.3,-6.84,-.25,-1.11],
// 4 0 -9.5 -.25 -2.3 -6.84 -.25 -1.11 -6.95 -.25 -.95 -7.11 -.25 -.84
  [4,0,-9.5,-.25,-2.3,-6.84,-.25,-1.11,-6.95,-.25,-.95,-7.11,-.25,-.84],
// 4 0 -9.5 -.25 -2.3 -7.11 -.25 -.84 -7.3 -.25 -.8 -9.59 -.25 -.8
  [4,0,-9.5,-.25,-2.3,-7.11,-.25,-.84,-7.3,-.25,-.8,-9.59,-.25,-.8],
// 3 0 -9.59 -.25 -.8 -11.1 -.25 -2.3 -9.5 -.25 -2.3
  [3,0,-9.59,-.25,-.8,-11.1,-.25,-2.3,-9.5,-.25,-2.3],
// 4 0 -6.8 -.25 1.2 -6.75 -.25 2.1 -6.8 -.25 3 -6.84 -.25 3.19
  [4,0,-6.8,-.25,1.2,-6.75,-.25,2.1,-6.8,-.25,3,-6.84,-.25,3.19],
// 4 0 -6.8 -.25 1.2 -6.84 -.25 3.19 -6.95 -.25 3.35 -7.11 -.25 3.46
  [4,0,-6.8,-.25,1.2,-6.84,-.25,3.19,-6.95,-.25,3.35,-7.11,-.25,3.46],
// 4 0 -6.8 -.25 1.2 -7.11 -.25 3.46 -7.3 -.25 3.5 -9 -.25 3.5
  [4,0,-6.8,-.25,1.2,-7.11,-.25,3.46,-7.3,-.25,3.5,-9,-.25,3.5],
// 4 0 -6.8 -.25 1.2 -9 -.25 3.5 -9.19 -.25 3.46 -9.35 -.25 3.35
  [4,0,-6.8,-.25,1.2,-9,-.25,3.5,-9.19,-.25,3.46,-9.35,-.25,3.35],
// 4 0 -6.8 -.25 1.2 -9.35 -.25 3.35 -9.46 -.25 3.19 -9.5 -.25 3
  [4,0,-6.8,-.25,1.2,-9.35,-.25,3.35,-9.46,-.25,3.19,-9.5,-.25,3],
// 4 0 -6.8 -.25 1.2 -9.5 -.25 3 -9.5 -.25 2.2 -6.84 -.25 1.01
  [4,0,-6.8,-.25,1.2,-9.5,-.25,3,-9.5,-.25,2.2,-6.84,-.25,1.01],
// 4 0 -6.95 -.25 .85 -6.84 -.25 1.01 -9.5 -.25 2.2 -7.11 -.25 .74
  [4,0,-6.95,-.25,.85,-6.84,-.25,1.01,-9.5,-.25,2.2,-7.11,-.25,.74],
// 4 0 -7.3 -.25 .7 -7.11 -.25 .74 -9.5 -.25 2.2 -9.59 -.25 .7
  [4,0,-7.3,-.25,.7,-7.11,-.25,.74,-9.5,-.25,2.2,-9.59,-.25,.7],
// 3 0 -9.5 -.25 2.2 -11.1 -.25 2.2 -9.59 -.25 .7
  [3,0,-9.5,-.25,2.2,-11.1,-.25,2.2,-9.59,-.25,.7],
// 4 0 -5.15 -.25 .43 -5.48 -.25 -.05 -5.15 -.25 -.53 -1.15 -.25 -.1
  [4,0,-5.15,-.25,.43,-5.48,-.25,-.05,-5.15,-.25,-.53,-1.15,-.25,-.1],
// 3 0 -5 -.25 1.2 -5.15 -.25 .43 -1.15 -.25 -.1
  [3,0,-5,-.25,1.2,-5.15,-.25,.43,-1.15,-.25,-.1],
// 4 0 -4.95 -.25 2.1 -5 -.25 1.2 -1.15 -.25 -.1 -1.1 -.25 2.9
  [4,0,-4.95,-.25,2.1,-5,-.25,1.2,-1.15,-.25,-.1,-1.1,-.25,2.9],
// 3 0 -5 -.25 3 -4.95 -.25 2.1 -1.1 -.25 2.9
  [3,0,-5,-.25,3,-4.95,-.25,2.1,-1.1,-.25,2.9],
// 4 0 -5.15 -.25 3.77 -5 -.25 3 -1.1 -.25 2.9 -.95 -.25 3.67
  [4,0,-5.15,-.25,3.77,-5,-.25,3,-1.1,-.25,2.9,-.95,-.25,3.67],
// 4 0 -5.15 -.25 3.77 -.95 -.25 3.67 -.51 -.25 4.31 -5.59 -.25 4.41
  [4,0,-5.15,-.25,3.77,-.95,-.25,3.67,-.51,-.25,4.31,-5.59,-.25,4.41],
// 4 0 -6.23 -.25 4.85 -5.59 -.25 4.41 -.51 -.25 4.31 .13 -.25 4.75
  [4,0,-6.23,-.25,4.85,-5.59,-.25,4.41,-.51,-.25,4.31,.13,-.25,4.75],
// 4 0 -6.23 -.25 4.85 .13 -.25 4.75 .9 -.25 4.9 -7 -.25 5
  [4,0,-6.23,-.25,4.85,.13,-.25,4.75,.9,-.25,4.9,-7,-.25,5],
// 4 0 -7 -.25 5 .9 -.25 4.9 2.15 -.25 4.95 -15.8 -.25 5.6
  [4,0,-7,-.25,5,.9,-.25,4.9,2.15,-.25,4.95,-15.8,-.25,5.6],
// 3 0 -1.15 -.25 -.1 -5.15 -.25 -.53 -5 -.25 -1.3
  [3,0,-1.15,-.25,-.1,-5.15,-.25,-.53,-5,-.25,-1.3],
// 4 0 -1.15 -.25 -.1 -5 -.25 -1.3 -4.95 -.25 -2.2 -1.1 -.25 -3.1
  [4,0,-1.15,-.25,-.1,-5,-.25,-1.3,-4.95,-.25,-2.2,-1.1,-.25,-3.1],
// 3 0 -4.95 -.25 -2.2 -5 -.25 -3.1 -1.1 -.25 -3.1
  [3,0,-4.95,-.25,-2.2,-5,-.25,-3.1,-1.1,-.25,-3.1],
// 4 0 -1.1 -.25 -3.1 -5 -.25 -3.1 -5.15 -.25 -3.87 -.95 -.25 -3.87
  [4,0,-1.1,-.25,-3.1,-5,-.25,-3.1,-5.15,-.25,-3.87,-.95,-.25,-3.87],
// 4 0 -.51 -.25 -4.51 -.95 -.25 -3.87 -5.15 -.25 -3.87 -5.59 -.25 -4.51
  [4,0,-.51,-.25,-4.51,-.95,-.25,-3.87,-5.15,-.25,-3.87,-5.59,-.25,-4.51],
// 4 0 -.51 -.25 -4.51 -5.59 -.25 -4.51 -6.23 -.25 -4.95 .13 -.25 -4.95
  [4,0,-.51,-.25,-4.51,-5.59,-.25,-4.51,-6.23,-.25,-4.95,.13,-.25,-4.95],
// 4 0 .9 -.25 -5.1 .13 -.25 -4.95 -6.23 -.25 -4.95 -7 -.25 -5.1
  [4,0,.9,-.25,-5.1,.13,-.25,-4.95,-6.23,-.25,-4.95,-7,-.25,-5.1],
// 4 0 2.15 -.25 -5.15 .9 -.25 -5.1 -7 -.25 -5.1 -15.8 -.25 -6
  [4,0,2.15,-.25,-5.15,.9,-.25,-5.1,-7,-.25,-5.1,-15.8,-.25,-6],
// 3 0 -10.95 -.25 -3.87 -15.8 -.25 -6 -10.51 -.25 -4.51
  [3,0,-10.95,-.25,-3.87,-15.8,-.25,-6,-10.51,-.25,-4.51],
// 3 0 -10.51 -.25 -4.51 -15.8 -.25 -6 -9.87 -.25 -4.95
  [3,0,-10.51,-.25,-4.51,-15.8,-.25,-6,-9.87,-.25,-4.95],
// 3 0 -9.87 -.25 -4.95 -15.8 -.25 -6 -9.1 -.25 -5.1
  [3,0,-9.87,-.25,-4.95,-15.8,-.25,-6,-9.1,-.25,-5.1],
// 3 0 -9.1 -.25 -5.1 -15.8 -.25 -6 -8.05 -.25 -5.15
  [3,0,-9.1,-.25,-5.1,-15.8,-.25,-6,-8.05,-.25,-5.15],
// 3 0 -7 -.25 -5.1 -8.05 -.25 -5.15 -15.8 -.25 -6
  [3,0,-7,-.25,-5.1,-8.05,-.25,-5.15,-15.8,-.25,-6],
// 4 0 .7 -.25 -3.1 .74 -.25 -3.29 .85 -.25 -3.45 1.01 -.25 -3.56
  [4,0,.7,-.25,-3.1,.74,-.25,-3.29,.85,-.25,-3.45,1.01,-.25,-3.56],
// 4 0 .7 -.25 -3.1 1.01 -.25 -3.56 1.2 -.25 -3.6 3.1 -.25 -3.6
  [4,0,.7,-.25,-3.1,1.01,-.25,-3.56,1.2,-.25,-3.6,3.1,-.25,-3.6],
// 4 0 .7 -.25 -3.1 3.1 -.25 -3.6 3.29 -.25 -3.56 3.45 -.25 -3.45
  [4,0,.7,-.25,-3.1,3.1,-.25,-3.6,3.29,-.25,-3.56,3.45,-.25,-3.45],
// 4 0 .7 -.25 -3.1 3.45 -.25 -3.45 3.56 -.25 -3.29 3.6 -.25 -3.1
  [4,0,.7,-.25,-3.1,3.45,-.25,-3.45,3.56,-.25,-3.29,3.6,-.25,-3.1],
// 4 0 .7 -.25 -3.1 3.6 -.25 -3.1 3.65 -.25 -.1 .65 -.25 -.1
  [4,0,.7,-.25,-3.1,3.6,-.25,-3.1,3.65,-.25,-.1,.65,-.25,-.1],
// 4 0 .65 -.25 -.1 3.65 -.25 -.1 3.6 -.25 2.9 .7 -.25 2.9
  [4,0,.65,-.25,-.1,3.65,-.25,-.1,3.6,-.25,2.9,.7,-.25,2.9],
// 4 0 .74 -.25 3.09 .7 -.25 2.9 3.6 -.25 2.9 .85 -.25 3.25
  [4,0,.74,-.25,3.09,.7,-.25,2.9,3.6,-.25,2.9,.85,-.25,3.25],
// 4 0 1.01 -.25 3.36 .85 -.25 3.25 3.6 -.25 2.9 1.2 -.25 3.4
  [4,0,1.01,-.25,3.36,.85,-.25,3.25,3.6,-.25,2.9,1.2,-.25,3.4],
// 4 0 3.1 -.25 3.4 1.2 -.25 3.4 3.6 -.25 2.9 3.29 -.25 3.36
  [4,0,3.1,-.25,3.4,1.2,-.25,3.4,3.6,-.25,2.9,3.29,-.25,3.36],
// 4 0 3.45 -.25 3.25 3.29 -.25 3.36 3.6 -.25 2.9 3.56 -.25 3.09
  [4,0,3.45,-.25,3.25,3.29,-.25,3.36,3.6,-.25,2.9,3.56,-.25,3.09],
// 3 0 15.6 -.25 5.6 -15.8 -.25 5.6 2.15 -.25 4.95
  [3,0,15.6,-.25,5.6,-15.8,-.25,5.6,2.15,-.25,4.95],
// 3 0 -15.8 -.25 5.6 -8.05 -.25 5.05 -7 -.25 5
  [3,0,-15.8,-.25,5.6,-8.05,-.25,5.05,-7,-.25,5],
// 3 0 -15.8 -.25 5.6 -9.1 -.25 5 -8.05 -.25 5.05
  [3,0,-15.8,-.25,5.6,-9.1,-.25,5,-8.05,-.25,5.05],
// 3 0 -15.8 -.25 5.6 -9.87 -.25 4.85 -9.1 -.25 5
  [3,0,-15.8,-.25,5.6,-9.87,-.25,4.85,-9.1,-.25,5],
// 3 0 -15.8 -.25 5.6 -10.51 -.25 4.41 -9.87 -.25 4.85
  [3,0,-15.8,-.25,5.6,-10.51,-.25,4.41,-9.87,-.25,4.85],
// 3 0 -15.8 -.25 5.6 -10.95 -.25 3.77 -10.51 -.25 4.41
  [3,0,-15.8,-.25,5.6,-10.95,-.25,3.77,-10.51,-.25,4.41],
];
module ldraw_lib__4174735e(step=0, col=false, unit=2/5, alt=false, line=0.2, solid=!$preview)
    makepoly(ldraw_lib__4174735e(), step=step, col=col, unit=unit, alt=alt, line=line, solid=solid);
ldraw_lib__4174735e(line=0.2);
